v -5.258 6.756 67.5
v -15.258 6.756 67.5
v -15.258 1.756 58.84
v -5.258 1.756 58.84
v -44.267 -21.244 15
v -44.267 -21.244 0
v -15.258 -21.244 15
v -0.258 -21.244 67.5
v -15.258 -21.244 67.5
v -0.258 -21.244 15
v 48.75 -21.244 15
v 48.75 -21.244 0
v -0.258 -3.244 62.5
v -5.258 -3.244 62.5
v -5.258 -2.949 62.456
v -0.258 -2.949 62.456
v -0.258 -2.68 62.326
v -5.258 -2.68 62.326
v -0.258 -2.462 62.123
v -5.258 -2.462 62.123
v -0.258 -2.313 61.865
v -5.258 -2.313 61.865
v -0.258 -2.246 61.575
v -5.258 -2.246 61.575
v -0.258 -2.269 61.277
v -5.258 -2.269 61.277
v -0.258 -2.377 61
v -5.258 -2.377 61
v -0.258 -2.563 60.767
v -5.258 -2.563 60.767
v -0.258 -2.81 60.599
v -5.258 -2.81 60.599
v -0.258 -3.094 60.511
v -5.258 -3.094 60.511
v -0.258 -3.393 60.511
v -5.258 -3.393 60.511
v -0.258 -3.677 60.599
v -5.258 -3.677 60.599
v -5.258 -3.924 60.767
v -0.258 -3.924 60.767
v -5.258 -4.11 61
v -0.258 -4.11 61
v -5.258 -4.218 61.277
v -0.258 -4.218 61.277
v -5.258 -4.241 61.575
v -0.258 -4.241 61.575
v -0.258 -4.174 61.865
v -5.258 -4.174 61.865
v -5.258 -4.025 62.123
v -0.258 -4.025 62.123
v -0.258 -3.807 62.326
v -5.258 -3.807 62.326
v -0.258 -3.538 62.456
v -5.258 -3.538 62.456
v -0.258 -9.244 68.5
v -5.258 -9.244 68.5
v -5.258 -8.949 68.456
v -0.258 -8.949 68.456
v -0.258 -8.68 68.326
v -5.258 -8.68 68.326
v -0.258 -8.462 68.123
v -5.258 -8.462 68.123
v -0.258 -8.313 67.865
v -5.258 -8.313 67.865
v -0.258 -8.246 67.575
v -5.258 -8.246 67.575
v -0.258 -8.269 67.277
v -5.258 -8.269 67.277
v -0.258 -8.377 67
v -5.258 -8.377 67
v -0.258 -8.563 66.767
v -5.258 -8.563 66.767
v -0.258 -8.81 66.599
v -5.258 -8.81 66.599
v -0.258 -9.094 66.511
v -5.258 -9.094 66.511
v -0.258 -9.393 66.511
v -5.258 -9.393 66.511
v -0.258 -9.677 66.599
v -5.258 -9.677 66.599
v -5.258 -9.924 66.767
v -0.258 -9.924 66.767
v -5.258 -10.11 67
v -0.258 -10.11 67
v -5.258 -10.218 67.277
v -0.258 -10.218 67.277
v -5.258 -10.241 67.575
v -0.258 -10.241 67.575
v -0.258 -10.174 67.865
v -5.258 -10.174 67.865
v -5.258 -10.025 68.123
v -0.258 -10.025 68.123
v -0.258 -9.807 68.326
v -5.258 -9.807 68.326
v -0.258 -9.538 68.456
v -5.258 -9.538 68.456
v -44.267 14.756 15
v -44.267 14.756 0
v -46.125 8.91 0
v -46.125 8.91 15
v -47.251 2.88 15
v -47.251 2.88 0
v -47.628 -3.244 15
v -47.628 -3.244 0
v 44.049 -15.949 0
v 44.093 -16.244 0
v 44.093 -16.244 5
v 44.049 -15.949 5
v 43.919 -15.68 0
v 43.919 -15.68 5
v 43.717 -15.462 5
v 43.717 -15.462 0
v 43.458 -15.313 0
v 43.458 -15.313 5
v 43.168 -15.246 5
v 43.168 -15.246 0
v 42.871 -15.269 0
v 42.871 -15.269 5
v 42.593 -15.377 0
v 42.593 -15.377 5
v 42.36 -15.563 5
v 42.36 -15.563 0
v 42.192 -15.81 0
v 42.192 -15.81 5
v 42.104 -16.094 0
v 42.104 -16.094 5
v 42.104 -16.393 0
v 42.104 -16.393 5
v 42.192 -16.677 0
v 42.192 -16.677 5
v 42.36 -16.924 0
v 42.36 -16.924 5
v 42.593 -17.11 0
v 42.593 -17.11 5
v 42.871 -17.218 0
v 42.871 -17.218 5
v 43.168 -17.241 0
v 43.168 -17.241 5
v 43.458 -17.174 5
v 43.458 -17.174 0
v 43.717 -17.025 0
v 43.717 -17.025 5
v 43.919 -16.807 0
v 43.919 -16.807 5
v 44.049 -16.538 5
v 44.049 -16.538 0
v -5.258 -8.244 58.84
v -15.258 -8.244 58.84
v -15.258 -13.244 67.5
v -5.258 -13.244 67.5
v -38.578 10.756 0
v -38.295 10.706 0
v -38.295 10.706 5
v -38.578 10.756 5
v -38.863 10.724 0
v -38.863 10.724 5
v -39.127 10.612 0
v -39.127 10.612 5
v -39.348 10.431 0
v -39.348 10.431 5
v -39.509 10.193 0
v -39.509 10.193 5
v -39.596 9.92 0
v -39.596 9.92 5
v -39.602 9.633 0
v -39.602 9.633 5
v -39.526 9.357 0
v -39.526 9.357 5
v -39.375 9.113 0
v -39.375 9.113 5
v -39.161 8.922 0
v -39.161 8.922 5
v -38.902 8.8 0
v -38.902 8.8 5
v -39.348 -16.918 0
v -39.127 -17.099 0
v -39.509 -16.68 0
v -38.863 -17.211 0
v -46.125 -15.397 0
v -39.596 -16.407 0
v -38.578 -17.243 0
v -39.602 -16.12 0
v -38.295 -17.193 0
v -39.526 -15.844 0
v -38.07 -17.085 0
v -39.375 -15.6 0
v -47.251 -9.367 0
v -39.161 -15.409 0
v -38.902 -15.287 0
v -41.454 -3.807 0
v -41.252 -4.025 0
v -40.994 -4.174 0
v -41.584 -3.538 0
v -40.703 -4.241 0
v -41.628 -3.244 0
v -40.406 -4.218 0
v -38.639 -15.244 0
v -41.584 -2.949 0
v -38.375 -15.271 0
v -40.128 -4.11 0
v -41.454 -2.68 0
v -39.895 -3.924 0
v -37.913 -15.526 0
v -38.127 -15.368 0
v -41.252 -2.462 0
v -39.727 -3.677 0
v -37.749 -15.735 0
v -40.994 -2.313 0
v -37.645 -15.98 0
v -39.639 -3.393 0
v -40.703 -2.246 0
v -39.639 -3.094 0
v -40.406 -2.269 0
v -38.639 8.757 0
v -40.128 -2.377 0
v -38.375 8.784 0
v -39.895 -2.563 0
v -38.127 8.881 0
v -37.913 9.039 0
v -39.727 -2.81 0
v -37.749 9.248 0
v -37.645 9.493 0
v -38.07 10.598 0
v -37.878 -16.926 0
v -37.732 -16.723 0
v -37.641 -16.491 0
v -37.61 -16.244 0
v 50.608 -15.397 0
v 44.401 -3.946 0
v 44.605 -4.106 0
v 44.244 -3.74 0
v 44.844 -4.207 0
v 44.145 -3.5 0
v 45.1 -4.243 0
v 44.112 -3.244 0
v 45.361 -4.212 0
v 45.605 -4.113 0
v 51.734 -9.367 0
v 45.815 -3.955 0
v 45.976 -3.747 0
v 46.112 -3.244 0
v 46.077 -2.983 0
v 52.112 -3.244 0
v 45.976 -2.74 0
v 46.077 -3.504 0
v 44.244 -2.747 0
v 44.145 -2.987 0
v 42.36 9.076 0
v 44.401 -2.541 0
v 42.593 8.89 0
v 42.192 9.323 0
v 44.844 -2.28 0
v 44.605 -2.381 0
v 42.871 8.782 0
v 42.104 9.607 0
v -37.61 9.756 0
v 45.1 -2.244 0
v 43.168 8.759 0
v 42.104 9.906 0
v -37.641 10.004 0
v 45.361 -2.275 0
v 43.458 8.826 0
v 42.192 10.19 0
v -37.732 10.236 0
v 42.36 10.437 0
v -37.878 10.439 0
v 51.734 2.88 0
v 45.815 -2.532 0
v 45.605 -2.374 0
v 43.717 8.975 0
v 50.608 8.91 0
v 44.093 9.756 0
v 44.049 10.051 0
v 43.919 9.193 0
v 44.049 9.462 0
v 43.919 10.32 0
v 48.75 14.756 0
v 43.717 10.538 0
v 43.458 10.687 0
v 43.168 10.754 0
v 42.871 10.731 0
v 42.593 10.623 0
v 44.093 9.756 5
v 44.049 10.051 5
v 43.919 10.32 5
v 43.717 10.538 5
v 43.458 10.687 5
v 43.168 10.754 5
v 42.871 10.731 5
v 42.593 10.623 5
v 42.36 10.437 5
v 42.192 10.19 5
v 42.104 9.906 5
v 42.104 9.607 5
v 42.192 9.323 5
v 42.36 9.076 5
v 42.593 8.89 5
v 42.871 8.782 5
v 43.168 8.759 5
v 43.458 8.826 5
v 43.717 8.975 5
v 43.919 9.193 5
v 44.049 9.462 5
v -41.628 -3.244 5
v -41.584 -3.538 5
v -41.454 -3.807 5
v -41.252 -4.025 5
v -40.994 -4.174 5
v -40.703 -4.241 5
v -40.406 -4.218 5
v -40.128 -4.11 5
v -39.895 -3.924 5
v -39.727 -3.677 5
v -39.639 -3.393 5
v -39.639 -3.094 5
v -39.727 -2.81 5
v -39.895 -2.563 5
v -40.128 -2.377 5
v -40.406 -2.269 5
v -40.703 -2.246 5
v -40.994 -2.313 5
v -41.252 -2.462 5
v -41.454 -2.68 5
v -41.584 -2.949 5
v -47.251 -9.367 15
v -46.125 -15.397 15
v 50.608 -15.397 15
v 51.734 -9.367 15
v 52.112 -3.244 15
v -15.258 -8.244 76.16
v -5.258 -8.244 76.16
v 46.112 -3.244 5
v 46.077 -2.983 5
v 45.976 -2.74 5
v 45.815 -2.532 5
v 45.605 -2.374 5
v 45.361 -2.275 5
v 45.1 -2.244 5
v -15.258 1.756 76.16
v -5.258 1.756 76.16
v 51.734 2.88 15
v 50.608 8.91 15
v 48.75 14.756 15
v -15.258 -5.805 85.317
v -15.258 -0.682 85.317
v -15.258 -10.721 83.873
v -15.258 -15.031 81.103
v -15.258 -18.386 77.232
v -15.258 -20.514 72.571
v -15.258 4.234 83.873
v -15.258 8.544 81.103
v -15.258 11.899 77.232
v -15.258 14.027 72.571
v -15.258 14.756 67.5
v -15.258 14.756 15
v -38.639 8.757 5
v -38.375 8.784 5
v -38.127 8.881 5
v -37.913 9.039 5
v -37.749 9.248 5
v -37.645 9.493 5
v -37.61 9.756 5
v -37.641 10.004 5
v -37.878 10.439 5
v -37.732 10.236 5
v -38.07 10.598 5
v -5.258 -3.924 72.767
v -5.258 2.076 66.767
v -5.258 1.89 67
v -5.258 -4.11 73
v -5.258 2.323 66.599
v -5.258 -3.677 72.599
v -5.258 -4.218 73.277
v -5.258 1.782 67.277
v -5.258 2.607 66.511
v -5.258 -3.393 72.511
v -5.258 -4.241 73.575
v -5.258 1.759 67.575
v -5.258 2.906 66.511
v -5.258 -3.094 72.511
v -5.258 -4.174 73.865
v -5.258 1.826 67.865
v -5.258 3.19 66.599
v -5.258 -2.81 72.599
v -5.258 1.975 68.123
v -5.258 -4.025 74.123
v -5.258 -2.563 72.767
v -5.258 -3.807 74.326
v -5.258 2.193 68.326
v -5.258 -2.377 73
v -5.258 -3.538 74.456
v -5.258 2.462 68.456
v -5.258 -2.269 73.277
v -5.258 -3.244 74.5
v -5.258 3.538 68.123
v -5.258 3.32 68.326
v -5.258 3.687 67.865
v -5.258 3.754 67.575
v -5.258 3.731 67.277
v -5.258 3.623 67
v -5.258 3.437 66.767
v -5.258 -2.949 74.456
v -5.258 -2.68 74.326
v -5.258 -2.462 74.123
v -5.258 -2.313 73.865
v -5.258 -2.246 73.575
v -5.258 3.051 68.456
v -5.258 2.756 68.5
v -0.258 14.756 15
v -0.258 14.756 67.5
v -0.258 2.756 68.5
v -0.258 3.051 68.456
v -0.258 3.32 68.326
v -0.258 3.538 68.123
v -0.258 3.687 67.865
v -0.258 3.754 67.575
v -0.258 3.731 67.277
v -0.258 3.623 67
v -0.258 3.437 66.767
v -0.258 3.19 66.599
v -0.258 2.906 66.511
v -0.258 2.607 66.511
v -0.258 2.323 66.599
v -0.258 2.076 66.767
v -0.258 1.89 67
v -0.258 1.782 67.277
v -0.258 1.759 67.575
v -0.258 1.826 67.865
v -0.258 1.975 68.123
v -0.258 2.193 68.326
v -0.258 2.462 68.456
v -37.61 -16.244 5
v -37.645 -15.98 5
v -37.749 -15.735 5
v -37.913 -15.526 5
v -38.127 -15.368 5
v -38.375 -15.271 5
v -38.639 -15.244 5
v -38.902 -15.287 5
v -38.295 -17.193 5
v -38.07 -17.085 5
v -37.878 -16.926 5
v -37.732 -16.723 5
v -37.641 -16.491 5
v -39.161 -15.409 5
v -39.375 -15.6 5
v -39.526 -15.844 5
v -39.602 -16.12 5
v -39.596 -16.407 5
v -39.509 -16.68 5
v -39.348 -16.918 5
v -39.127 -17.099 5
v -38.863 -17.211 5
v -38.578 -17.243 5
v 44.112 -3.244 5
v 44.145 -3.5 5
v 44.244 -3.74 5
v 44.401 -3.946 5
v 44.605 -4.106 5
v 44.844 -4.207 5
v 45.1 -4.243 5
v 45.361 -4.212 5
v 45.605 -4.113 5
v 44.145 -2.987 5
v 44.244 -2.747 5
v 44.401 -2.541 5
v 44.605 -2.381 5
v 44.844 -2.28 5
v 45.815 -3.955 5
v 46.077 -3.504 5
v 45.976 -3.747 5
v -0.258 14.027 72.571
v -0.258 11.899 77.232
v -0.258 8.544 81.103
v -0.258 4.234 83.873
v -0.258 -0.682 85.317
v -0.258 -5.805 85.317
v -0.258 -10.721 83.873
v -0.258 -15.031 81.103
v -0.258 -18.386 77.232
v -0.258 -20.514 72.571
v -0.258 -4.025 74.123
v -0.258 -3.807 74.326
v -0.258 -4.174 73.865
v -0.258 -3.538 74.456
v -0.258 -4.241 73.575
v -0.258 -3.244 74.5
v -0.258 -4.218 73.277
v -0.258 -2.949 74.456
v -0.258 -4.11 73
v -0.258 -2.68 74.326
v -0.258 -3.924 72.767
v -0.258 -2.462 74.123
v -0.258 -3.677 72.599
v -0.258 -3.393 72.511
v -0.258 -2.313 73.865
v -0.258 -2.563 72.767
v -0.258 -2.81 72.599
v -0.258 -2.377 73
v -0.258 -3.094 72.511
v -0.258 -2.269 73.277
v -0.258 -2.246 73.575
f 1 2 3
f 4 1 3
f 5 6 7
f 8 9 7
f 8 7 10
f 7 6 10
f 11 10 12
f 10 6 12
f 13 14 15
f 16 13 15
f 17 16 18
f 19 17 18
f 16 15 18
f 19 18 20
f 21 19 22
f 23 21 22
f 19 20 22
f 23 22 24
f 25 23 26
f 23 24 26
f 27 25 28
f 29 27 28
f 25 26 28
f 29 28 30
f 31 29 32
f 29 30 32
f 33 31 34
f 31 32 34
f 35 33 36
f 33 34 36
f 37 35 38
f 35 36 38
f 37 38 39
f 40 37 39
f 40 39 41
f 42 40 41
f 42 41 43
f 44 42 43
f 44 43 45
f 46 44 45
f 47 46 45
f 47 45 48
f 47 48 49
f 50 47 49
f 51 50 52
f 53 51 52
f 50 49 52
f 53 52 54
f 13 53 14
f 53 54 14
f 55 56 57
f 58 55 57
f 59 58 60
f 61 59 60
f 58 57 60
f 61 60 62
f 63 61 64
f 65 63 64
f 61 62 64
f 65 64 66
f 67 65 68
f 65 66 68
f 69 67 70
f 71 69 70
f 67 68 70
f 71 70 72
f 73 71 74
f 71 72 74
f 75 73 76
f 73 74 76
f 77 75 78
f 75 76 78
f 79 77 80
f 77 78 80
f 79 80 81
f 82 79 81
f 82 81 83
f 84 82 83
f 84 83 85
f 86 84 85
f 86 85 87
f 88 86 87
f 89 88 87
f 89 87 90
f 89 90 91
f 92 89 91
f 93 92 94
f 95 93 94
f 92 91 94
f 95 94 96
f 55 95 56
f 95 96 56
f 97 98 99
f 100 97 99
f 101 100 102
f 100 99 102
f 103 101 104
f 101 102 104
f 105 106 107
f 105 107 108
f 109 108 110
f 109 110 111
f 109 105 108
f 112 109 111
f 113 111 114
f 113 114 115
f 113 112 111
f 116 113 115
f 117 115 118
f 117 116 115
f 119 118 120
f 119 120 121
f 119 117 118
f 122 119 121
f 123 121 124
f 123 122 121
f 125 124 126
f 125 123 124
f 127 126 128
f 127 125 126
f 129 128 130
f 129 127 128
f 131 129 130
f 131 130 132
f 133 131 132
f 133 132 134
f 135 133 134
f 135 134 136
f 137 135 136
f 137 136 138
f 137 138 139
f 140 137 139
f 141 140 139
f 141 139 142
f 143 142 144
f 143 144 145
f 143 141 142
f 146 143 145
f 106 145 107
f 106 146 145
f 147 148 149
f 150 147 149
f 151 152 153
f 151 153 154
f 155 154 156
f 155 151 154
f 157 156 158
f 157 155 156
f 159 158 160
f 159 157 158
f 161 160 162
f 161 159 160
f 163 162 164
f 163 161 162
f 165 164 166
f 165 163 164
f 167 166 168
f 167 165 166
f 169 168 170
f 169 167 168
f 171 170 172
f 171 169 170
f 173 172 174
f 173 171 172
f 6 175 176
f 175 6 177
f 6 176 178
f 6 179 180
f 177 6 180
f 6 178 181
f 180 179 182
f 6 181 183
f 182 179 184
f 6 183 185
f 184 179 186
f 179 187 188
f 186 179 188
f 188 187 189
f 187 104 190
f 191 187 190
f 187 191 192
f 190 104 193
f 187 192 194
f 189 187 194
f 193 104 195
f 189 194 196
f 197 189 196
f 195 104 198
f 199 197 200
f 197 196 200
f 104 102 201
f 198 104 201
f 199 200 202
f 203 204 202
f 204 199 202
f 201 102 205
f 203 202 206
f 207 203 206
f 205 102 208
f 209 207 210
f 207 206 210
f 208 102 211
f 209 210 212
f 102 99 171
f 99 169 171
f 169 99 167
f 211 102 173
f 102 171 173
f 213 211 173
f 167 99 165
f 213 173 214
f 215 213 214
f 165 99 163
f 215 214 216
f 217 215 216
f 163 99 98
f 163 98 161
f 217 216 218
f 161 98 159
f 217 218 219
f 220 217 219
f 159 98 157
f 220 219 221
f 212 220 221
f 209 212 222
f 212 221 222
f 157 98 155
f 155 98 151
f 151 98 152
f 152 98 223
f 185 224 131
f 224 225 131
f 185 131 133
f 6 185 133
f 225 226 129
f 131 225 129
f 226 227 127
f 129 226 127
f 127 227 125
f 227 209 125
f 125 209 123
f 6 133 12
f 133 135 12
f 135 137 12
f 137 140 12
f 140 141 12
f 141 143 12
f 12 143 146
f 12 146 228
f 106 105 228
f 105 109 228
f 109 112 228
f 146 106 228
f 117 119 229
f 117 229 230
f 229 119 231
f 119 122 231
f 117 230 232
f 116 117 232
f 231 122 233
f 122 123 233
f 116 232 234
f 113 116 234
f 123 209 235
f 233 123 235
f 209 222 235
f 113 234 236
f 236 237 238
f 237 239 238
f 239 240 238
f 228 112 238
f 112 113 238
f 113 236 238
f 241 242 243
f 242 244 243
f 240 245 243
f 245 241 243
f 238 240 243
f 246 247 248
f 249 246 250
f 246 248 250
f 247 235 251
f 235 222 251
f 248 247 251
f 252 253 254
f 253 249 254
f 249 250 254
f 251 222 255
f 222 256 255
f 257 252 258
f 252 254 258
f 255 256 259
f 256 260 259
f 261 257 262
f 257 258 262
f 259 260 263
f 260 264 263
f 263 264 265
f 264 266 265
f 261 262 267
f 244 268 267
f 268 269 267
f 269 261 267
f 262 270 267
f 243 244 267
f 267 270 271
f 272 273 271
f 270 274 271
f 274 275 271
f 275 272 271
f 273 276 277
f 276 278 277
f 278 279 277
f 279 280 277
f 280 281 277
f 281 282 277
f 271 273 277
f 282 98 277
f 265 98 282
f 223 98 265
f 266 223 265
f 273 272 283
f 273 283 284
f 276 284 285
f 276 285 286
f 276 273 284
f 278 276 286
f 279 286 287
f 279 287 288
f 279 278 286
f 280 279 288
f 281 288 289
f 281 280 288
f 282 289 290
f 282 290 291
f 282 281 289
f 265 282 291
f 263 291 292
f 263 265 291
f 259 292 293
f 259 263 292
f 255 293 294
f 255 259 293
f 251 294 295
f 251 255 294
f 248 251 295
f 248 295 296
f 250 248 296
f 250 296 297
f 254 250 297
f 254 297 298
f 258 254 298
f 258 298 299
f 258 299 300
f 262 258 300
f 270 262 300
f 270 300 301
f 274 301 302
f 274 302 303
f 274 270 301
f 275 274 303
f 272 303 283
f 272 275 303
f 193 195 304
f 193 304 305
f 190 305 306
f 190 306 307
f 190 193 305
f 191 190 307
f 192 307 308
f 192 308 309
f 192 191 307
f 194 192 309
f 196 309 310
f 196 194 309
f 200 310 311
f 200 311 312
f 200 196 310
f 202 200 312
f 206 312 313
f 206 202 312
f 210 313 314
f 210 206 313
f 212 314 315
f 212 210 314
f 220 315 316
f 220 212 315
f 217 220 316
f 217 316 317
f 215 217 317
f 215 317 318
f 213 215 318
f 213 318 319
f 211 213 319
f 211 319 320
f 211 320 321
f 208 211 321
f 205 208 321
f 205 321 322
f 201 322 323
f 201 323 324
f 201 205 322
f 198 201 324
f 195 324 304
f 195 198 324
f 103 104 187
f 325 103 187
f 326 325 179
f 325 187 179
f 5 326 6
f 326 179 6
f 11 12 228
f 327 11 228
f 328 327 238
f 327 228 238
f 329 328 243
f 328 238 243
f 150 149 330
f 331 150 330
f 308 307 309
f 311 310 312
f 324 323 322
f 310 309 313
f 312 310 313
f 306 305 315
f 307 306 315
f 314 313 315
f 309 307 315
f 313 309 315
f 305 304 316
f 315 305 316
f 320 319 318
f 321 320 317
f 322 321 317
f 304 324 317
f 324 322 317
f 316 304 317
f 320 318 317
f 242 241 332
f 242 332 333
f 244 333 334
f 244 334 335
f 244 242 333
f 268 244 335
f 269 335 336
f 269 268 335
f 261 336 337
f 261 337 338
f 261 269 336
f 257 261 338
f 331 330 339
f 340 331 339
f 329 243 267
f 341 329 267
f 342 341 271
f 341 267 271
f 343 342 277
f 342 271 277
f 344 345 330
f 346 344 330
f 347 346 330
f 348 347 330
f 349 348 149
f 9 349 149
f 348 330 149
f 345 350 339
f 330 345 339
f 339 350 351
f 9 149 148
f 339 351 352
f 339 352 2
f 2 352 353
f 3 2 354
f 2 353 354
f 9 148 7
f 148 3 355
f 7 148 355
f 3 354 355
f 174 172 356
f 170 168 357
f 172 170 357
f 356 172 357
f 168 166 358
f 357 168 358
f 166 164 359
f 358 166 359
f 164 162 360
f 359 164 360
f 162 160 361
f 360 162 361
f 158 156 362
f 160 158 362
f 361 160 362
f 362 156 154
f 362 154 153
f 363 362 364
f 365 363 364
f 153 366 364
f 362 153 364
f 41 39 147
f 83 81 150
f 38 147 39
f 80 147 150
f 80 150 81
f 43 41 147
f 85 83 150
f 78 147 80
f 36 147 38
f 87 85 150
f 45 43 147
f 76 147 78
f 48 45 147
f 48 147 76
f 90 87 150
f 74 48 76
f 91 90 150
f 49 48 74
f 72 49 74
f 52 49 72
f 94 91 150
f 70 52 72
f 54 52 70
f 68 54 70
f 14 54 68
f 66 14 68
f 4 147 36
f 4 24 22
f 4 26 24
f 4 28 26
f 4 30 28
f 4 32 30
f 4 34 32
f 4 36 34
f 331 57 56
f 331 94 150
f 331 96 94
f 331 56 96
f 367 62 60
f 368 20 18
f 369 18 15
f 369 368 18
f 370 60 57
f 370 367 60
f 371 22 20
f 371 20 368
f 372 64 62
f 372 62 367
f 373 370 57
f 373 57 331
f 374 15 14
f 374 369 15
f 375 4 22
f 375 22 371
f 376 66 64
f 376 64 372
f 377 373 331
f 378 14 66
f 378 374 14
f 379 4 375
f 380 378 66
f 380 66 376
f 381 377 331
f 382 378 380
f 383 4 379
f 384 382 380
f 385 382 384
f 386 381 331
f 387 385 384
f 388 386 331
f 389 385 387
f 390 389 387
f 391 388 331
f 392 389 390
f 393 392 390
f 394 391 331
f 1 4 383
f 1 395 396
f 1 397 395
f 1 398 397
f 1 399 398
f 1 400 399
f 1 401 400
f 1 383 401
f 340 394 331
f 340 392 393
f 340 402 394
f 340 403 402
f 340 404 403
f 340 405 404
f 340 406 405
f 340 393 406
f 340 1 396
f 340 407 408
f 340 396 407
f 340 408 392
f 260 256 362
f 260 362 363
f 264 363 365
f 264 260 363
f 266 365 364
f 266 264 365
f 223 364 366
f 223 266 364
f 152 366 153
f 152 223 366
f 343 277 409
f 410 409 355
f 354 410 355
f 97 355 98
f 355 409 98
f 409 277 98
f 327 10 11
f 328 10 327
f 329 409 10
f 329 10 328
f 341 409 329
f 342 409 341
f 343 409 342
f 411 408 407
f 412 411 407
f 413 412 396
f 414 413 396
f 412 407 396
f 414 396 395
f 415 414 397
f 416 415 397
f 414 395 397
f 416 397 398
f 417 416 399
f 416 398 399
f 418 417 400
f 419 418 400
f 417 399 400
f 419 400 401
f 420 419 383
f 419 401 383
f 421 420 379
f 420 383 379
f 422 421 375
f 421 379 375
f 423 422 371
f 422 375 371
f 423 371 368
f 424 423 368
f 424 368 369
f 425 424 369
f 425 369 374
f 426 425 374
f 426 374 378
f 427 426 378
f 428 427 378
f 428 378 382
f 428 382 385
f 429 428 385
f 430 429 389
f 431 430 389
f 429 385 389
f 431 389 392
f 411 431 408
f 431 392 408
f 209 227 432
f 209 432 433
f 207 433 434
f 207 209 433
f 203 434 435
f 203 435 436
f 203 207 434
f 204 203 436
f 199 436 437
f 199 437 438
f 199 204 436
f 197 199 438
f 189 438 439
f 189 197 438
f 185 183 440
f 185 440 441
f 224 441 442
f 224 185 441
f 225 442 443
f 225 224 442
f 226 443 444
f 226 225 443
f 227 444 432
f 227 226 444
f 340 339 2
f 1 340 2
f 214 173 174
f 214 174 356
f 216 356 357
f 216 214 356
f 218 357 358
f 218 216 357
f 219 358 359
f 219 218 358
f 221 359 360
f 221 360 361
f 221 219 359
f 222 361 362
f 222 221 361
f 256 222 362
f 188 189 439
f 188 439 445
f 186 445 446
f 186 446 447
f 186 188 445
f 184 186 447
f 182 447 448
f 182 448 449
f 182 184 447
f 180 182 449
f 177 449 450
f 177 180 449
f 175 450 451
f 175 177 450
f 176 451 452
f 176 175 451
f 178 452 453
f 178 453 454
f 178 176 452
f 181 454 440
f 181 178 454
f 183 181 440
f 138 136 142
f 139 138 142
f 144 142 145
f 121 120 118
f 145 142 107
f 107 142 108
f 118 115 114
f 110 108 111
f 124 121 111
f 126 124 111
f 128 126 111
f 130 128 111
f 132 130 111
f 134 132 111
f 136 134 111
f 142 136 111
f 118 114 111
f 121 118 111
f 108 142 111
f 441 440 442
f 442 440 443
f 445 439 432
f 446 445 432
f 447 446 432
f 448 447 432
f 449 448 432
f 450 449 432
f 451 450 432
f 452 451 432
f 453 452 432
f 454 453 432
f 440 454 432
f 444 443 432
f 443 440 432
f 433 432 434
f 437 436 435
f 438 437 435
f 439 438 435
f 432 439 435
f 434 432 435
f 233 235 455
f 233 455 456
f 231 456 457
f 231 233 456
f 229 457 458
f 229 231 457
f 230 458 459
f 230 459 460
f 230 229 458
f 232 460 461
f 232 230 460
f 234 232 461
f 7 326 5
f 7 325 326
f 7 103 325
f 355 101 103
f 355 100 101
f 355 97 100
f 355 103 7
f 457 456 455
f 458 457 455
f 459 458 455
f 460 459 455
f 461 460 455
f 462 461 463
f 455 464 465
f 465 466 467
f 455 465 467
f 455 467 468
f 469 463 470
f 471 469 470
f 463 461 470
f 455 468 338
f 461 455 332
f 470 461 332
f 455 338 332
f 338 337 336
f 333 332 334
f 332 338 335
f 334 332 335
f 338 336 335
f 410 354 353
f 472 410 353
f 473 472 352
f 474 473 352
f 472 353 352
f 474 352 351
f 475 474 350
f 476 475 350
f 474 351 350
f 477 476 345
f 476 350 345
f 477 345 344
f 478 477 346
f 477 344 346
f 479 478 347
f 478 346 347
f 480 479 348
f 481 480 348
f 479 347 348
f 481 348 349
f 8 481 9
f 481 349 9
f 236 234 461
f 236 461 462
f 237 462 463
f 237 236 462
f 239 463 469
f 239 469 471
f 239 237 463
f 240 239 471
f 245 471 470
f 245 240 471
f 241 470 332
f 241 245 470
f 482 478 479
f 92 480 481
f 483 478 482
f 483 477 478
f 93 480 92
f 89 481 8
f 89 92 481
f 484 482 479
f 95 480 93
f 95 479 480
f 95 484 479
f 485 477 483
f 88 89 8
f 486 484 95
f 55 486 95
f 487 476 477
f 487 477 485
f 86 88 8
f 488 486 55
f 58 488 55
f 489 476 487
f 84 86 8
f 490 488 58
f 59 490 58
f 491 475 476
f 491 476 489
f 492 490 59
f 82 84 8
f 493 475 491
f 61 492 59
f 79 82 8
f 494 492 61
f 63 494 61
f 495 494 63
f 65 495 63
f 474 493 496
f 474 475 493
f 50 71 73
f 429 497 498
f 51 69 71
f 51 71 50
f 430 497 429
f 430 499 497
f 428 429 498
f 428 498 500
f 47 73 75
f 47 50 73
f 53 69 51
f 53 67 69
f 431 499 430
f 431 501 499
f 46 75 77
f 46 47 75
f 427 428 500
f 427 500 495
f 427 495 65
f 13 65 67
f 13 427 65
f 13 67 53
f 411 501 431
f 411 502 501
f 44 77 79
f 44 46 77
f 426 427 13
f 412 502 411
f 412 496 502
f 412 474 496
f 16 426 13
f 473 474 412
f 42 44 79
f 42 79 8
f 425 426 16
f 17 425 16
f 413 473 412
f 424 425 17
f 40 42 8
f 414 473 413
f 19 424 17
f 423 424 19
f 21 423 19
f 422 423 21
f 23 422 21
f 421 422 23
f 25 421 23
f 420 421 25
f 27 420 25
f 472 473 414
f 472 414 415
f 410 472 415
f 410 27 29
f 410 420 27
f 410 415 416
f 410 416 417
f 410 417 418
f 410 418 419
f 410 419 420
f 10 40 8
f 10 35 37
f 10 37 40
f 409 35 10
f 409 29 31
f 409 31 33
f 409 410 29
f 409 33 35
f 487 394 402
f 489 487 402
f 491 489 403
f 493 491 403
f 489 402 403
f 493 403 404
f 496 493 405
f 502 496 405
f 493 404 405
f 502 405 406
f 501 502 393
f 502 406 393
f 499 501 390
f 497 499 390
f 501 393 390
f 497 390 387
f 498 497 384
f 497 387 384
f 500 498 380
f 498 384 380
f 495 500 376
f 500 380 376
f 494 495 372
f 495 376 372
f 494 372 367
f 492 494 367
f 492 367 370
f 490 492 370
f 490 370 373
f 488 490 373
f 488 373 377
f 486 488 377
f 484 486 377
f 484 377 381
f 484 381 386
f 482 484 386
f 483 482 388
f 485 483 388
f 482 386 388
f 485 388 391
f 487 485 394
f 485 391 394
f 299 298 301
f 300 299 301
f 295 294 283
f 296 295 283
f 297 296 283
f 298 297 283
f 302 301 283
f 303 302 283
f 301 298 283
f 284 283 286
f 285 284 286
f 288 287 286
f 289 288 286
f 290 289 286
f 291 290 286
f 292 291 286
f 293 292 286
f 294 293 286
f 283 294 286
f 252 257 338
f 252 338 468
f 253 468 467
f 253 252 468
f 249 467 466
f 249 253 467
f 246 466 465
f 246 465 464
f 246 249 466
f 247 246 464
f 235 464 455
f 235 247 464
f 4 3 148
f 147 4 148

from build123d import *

# Parameters (mm, degrees)
SKETCH_2_W           = 99.74
SKETCH_2_H           = 36
EXTRUDE_1_DEPTH      = 15
SKETCH_3_R           = 1
CUT_EXTRUDE_1_DEPTH  = 5
CUT_EXTRUDE_2_REACH  = 60.24
EXTRUDE_2_DEPTH      = 7.5
EXTRUDE_2_DEPTH_BACK = 7.5
CUT_EXTRUDE_3_DEPTH  = 10
SKETCH_7_R           = 1
CUT_EXTRUDE_4_DEPTH  = 5


with BuildPart() as part:
    # 草图2 → 凸台-拉伸1 (new body)
    with BuildSketch(Plane.XY):
        with Locations((2.241740979, -3.243503904)):
            Rectangle(SKETCH_2_W, SKETCH_2_H)
    extrude(amount=EXTRUDE_1_DEPTH)

    # 草图3 → 切除-拉伸1 (cut)
    with BuildSketch(Plane.XY):
        with Locations((-40.628259021, -3.243503904)):
            Circle(SKETCH_3_R)
        with Locations((43.0931412, 9.756496096)):
            Circle(SKETCH_3_R)
        with Locations((43.0931412, -16.243503904)):
            Circle(SKETCH_3_R)
        with Locations((45.111740979, -3.243503904)):
            Circle(SKETCH_3_R)
        with Locations((-38.609659242, -16.243503904)):
            Circle(SKETCH_3_R)
        with Locations((-38.609659242, 9.756496096)):
            Circle(SKETCH_3_R)
    extrude(amount=CUT_EXTRUDE_1_DEPTH, mode=Mode.SUBTRACT)

    # 草图4 → 切除-拉伸2 (cut, up to next)
    with BuildSketch(Plane(origin=(0, 0, 0), x_dir=(-1, 0, 0), z_dir=(0, 0, -1)), mode=Mode.PRIVATE) as cut_extrude_2_sk1:
        with BuildLine():
            ThreePointArc((-52.111740979, -3.243503904), (-51.264098651, 5.912114498), (-48.749986485, 14.756496096))
            Line((-48.749986485, 14.756496096), (-52.111740979, 14.756496096))
            Line((-52.111740979, 14.756496096), (-52.111740979, -3.243503904))
        make_face()
    cut_extrude_2_tool1 = extrude(cut_extrude_2_sk1.sketch, amount=-CUT_EXTRUDE_2_REACH, mode=Mode.PRIVATE) & part.part
    # 草图4 → 切除-拉伸2 (cut, up to next)
    with BuildSketch(Plane(origin=(0, 0, 0), x_dir=(-1, 0, 0), z_dir=(0, 0, -1)), mode=Mode.PRIVATE) as cut_extrude_2_sk2:
        with BuildLine():
            Line((47.628259021, 14.756496096), (44.266504526, 14.756496096))
            ThreePointArc((44.266504526, 14.756496096), (46.780616692, 5.912114498), (47.628259021, -3.243503904))
            Line((47.628259021, -3.243503904), (47.628259021, 14.756496096))
        make_face()
    cut_extrude_2_tool2 = extrude(cut_extrude_2_sk2.sketch, amount=-CUT_EXTRUDE_2_REACH, mode=Mode.PRIVATE) & part.part
    # 草图4 → 切除-拉伸2 (cut, up to next)
    with BuildSketch(Plane(origin=(0, 0, 0), x_dir=(-1, 0, 0), z_dir=(0, 0, -1)), mode=Mode.PRIVATE) as cut_extrude_2_sk3:
        with BuildLine():
            ThreePointArc((-48.749986485, -21.243503904), (-51.264098651, -12.399122306), (-52.111740979, -3.243503904))
            Line((-52.111740979, -3.243503904), (-52.111740979, -21.243503904))
            Line((-52.111740979, -21.243503904), (-48.749986485, -21.243503904))
        make_face()
    cut_extrude_2_tool3 = extrude(cut_extrude_2_sk3.sketch, amount=-CUT_EXTRUDE_2_REACH, mode=Mode.PRIVATE) & part.part
    # 草图4 → 切除-拉伸2 (cut, up to next)
    with BuildSketch(Plane(origin=(0, 0, 0), x_dir=(-1, 0, 0), z_dir=(0, 0, -1)), mode=Mode.PRIVATE) as cut_extrude_2_sk4:
        with BuildLine():
            Line((47.628259021, -21.243503904), (47.628259021, -3.243503904))
            ThreePointArc((47.628259021, -3.243503904), (46.780616692, -12.399122306), (44.266504526, -21.243503904))
            Line((44.266504526, -21.243503904), (47.628259021, -21.243503904))
        make_face()
    cut_extrude_2_tool4 = extrude(cut_extrude_2_sk4.sketch, amount=-CUT_EXTRUDE_2_REACH, mode=Mode.PRIVATE) & part.part
    add(cut_extrude_2_tool1.solids().sort_by_distance((51.109322, 10.28739, 0))[0], mode=Mode.SUBTRACT)
    add(cut_extrude_2_tool2.solids().sort_by_distance((-46.62584, 10.28739, 0))[0], mode=Mode.SUBTRACT)
    add(cut_extrude_2_tool3.solids().sort_by_distance((51.109322, -16.774398, 0))[0], mode=Mode.SUBTRACT)
    add(cut_extrude_2_tool4.solids().sort_by_distance((-46.62584, -16.774398, 0))[0], mode=Mode.SUBTRACT)

    # 草图5 → 凸台-拉伸2 (add, two sides: drawn at the far end of the back side and taken through both)
    with BuildSketch(Plane(origin=(-7.758259021, -3.243503904, 0), x_dir=(0, 0, -1), z_dir=(1, 0, 0)).offset(-EXTRUDE_2_DEPTH_BACK)):
        with BuildLine():
            Line((-67.5, -18), (-15, -18))
            Line((-15, -18), (-15, 18))
            Line((-15, 18), (-67.5, 18))
            ThreePointArc((-67.5, 18), (-85.5, 0), (-67.5, -18))
        make_face()
    extrude(amount=EXTRUDE_2_DEPTH + EXTRUDE_2_DEPTH_BACK)

    # 草图6 → 切除-拉伸3 (cut)
    with BuildSketch(Plane.ZY.offset(15.258259021)):
        Polygon((76.160254038, 1.756496096), (67.5, 6.756496096), (58.839745962, 1.756496096), (58.839745962, -8.243503904), (67.5, -13.243503904), (76.160254038, -8.243503904), align=None)
    extrude(amount=-CUT_EXTRUDE_3_DEPTH, mode=Mode.SUBTRACT)

    # 草图7 → 切除-拉伸4 (cut)
    with BuildSketch(Plane.ZY.offset(5.258259021)):
        with Locations((67.5, 2.756496096)):
            Circle(SKETCH_7_R)
        with Locations((73.5, -3.243503904)):
            Circle(SKETCH_7_R)
        with Locations((61.5, -3.243503904)):
            Circle(SKETCH_7_R)
        with Locations((67.5, -9.243503904)):
            Circle(SKETCH_7_R)
    extrude(amount=-CUT_EXTRUDE_4_DEPTH, mode=Mode.SUBTRACT)


solid = part.part
